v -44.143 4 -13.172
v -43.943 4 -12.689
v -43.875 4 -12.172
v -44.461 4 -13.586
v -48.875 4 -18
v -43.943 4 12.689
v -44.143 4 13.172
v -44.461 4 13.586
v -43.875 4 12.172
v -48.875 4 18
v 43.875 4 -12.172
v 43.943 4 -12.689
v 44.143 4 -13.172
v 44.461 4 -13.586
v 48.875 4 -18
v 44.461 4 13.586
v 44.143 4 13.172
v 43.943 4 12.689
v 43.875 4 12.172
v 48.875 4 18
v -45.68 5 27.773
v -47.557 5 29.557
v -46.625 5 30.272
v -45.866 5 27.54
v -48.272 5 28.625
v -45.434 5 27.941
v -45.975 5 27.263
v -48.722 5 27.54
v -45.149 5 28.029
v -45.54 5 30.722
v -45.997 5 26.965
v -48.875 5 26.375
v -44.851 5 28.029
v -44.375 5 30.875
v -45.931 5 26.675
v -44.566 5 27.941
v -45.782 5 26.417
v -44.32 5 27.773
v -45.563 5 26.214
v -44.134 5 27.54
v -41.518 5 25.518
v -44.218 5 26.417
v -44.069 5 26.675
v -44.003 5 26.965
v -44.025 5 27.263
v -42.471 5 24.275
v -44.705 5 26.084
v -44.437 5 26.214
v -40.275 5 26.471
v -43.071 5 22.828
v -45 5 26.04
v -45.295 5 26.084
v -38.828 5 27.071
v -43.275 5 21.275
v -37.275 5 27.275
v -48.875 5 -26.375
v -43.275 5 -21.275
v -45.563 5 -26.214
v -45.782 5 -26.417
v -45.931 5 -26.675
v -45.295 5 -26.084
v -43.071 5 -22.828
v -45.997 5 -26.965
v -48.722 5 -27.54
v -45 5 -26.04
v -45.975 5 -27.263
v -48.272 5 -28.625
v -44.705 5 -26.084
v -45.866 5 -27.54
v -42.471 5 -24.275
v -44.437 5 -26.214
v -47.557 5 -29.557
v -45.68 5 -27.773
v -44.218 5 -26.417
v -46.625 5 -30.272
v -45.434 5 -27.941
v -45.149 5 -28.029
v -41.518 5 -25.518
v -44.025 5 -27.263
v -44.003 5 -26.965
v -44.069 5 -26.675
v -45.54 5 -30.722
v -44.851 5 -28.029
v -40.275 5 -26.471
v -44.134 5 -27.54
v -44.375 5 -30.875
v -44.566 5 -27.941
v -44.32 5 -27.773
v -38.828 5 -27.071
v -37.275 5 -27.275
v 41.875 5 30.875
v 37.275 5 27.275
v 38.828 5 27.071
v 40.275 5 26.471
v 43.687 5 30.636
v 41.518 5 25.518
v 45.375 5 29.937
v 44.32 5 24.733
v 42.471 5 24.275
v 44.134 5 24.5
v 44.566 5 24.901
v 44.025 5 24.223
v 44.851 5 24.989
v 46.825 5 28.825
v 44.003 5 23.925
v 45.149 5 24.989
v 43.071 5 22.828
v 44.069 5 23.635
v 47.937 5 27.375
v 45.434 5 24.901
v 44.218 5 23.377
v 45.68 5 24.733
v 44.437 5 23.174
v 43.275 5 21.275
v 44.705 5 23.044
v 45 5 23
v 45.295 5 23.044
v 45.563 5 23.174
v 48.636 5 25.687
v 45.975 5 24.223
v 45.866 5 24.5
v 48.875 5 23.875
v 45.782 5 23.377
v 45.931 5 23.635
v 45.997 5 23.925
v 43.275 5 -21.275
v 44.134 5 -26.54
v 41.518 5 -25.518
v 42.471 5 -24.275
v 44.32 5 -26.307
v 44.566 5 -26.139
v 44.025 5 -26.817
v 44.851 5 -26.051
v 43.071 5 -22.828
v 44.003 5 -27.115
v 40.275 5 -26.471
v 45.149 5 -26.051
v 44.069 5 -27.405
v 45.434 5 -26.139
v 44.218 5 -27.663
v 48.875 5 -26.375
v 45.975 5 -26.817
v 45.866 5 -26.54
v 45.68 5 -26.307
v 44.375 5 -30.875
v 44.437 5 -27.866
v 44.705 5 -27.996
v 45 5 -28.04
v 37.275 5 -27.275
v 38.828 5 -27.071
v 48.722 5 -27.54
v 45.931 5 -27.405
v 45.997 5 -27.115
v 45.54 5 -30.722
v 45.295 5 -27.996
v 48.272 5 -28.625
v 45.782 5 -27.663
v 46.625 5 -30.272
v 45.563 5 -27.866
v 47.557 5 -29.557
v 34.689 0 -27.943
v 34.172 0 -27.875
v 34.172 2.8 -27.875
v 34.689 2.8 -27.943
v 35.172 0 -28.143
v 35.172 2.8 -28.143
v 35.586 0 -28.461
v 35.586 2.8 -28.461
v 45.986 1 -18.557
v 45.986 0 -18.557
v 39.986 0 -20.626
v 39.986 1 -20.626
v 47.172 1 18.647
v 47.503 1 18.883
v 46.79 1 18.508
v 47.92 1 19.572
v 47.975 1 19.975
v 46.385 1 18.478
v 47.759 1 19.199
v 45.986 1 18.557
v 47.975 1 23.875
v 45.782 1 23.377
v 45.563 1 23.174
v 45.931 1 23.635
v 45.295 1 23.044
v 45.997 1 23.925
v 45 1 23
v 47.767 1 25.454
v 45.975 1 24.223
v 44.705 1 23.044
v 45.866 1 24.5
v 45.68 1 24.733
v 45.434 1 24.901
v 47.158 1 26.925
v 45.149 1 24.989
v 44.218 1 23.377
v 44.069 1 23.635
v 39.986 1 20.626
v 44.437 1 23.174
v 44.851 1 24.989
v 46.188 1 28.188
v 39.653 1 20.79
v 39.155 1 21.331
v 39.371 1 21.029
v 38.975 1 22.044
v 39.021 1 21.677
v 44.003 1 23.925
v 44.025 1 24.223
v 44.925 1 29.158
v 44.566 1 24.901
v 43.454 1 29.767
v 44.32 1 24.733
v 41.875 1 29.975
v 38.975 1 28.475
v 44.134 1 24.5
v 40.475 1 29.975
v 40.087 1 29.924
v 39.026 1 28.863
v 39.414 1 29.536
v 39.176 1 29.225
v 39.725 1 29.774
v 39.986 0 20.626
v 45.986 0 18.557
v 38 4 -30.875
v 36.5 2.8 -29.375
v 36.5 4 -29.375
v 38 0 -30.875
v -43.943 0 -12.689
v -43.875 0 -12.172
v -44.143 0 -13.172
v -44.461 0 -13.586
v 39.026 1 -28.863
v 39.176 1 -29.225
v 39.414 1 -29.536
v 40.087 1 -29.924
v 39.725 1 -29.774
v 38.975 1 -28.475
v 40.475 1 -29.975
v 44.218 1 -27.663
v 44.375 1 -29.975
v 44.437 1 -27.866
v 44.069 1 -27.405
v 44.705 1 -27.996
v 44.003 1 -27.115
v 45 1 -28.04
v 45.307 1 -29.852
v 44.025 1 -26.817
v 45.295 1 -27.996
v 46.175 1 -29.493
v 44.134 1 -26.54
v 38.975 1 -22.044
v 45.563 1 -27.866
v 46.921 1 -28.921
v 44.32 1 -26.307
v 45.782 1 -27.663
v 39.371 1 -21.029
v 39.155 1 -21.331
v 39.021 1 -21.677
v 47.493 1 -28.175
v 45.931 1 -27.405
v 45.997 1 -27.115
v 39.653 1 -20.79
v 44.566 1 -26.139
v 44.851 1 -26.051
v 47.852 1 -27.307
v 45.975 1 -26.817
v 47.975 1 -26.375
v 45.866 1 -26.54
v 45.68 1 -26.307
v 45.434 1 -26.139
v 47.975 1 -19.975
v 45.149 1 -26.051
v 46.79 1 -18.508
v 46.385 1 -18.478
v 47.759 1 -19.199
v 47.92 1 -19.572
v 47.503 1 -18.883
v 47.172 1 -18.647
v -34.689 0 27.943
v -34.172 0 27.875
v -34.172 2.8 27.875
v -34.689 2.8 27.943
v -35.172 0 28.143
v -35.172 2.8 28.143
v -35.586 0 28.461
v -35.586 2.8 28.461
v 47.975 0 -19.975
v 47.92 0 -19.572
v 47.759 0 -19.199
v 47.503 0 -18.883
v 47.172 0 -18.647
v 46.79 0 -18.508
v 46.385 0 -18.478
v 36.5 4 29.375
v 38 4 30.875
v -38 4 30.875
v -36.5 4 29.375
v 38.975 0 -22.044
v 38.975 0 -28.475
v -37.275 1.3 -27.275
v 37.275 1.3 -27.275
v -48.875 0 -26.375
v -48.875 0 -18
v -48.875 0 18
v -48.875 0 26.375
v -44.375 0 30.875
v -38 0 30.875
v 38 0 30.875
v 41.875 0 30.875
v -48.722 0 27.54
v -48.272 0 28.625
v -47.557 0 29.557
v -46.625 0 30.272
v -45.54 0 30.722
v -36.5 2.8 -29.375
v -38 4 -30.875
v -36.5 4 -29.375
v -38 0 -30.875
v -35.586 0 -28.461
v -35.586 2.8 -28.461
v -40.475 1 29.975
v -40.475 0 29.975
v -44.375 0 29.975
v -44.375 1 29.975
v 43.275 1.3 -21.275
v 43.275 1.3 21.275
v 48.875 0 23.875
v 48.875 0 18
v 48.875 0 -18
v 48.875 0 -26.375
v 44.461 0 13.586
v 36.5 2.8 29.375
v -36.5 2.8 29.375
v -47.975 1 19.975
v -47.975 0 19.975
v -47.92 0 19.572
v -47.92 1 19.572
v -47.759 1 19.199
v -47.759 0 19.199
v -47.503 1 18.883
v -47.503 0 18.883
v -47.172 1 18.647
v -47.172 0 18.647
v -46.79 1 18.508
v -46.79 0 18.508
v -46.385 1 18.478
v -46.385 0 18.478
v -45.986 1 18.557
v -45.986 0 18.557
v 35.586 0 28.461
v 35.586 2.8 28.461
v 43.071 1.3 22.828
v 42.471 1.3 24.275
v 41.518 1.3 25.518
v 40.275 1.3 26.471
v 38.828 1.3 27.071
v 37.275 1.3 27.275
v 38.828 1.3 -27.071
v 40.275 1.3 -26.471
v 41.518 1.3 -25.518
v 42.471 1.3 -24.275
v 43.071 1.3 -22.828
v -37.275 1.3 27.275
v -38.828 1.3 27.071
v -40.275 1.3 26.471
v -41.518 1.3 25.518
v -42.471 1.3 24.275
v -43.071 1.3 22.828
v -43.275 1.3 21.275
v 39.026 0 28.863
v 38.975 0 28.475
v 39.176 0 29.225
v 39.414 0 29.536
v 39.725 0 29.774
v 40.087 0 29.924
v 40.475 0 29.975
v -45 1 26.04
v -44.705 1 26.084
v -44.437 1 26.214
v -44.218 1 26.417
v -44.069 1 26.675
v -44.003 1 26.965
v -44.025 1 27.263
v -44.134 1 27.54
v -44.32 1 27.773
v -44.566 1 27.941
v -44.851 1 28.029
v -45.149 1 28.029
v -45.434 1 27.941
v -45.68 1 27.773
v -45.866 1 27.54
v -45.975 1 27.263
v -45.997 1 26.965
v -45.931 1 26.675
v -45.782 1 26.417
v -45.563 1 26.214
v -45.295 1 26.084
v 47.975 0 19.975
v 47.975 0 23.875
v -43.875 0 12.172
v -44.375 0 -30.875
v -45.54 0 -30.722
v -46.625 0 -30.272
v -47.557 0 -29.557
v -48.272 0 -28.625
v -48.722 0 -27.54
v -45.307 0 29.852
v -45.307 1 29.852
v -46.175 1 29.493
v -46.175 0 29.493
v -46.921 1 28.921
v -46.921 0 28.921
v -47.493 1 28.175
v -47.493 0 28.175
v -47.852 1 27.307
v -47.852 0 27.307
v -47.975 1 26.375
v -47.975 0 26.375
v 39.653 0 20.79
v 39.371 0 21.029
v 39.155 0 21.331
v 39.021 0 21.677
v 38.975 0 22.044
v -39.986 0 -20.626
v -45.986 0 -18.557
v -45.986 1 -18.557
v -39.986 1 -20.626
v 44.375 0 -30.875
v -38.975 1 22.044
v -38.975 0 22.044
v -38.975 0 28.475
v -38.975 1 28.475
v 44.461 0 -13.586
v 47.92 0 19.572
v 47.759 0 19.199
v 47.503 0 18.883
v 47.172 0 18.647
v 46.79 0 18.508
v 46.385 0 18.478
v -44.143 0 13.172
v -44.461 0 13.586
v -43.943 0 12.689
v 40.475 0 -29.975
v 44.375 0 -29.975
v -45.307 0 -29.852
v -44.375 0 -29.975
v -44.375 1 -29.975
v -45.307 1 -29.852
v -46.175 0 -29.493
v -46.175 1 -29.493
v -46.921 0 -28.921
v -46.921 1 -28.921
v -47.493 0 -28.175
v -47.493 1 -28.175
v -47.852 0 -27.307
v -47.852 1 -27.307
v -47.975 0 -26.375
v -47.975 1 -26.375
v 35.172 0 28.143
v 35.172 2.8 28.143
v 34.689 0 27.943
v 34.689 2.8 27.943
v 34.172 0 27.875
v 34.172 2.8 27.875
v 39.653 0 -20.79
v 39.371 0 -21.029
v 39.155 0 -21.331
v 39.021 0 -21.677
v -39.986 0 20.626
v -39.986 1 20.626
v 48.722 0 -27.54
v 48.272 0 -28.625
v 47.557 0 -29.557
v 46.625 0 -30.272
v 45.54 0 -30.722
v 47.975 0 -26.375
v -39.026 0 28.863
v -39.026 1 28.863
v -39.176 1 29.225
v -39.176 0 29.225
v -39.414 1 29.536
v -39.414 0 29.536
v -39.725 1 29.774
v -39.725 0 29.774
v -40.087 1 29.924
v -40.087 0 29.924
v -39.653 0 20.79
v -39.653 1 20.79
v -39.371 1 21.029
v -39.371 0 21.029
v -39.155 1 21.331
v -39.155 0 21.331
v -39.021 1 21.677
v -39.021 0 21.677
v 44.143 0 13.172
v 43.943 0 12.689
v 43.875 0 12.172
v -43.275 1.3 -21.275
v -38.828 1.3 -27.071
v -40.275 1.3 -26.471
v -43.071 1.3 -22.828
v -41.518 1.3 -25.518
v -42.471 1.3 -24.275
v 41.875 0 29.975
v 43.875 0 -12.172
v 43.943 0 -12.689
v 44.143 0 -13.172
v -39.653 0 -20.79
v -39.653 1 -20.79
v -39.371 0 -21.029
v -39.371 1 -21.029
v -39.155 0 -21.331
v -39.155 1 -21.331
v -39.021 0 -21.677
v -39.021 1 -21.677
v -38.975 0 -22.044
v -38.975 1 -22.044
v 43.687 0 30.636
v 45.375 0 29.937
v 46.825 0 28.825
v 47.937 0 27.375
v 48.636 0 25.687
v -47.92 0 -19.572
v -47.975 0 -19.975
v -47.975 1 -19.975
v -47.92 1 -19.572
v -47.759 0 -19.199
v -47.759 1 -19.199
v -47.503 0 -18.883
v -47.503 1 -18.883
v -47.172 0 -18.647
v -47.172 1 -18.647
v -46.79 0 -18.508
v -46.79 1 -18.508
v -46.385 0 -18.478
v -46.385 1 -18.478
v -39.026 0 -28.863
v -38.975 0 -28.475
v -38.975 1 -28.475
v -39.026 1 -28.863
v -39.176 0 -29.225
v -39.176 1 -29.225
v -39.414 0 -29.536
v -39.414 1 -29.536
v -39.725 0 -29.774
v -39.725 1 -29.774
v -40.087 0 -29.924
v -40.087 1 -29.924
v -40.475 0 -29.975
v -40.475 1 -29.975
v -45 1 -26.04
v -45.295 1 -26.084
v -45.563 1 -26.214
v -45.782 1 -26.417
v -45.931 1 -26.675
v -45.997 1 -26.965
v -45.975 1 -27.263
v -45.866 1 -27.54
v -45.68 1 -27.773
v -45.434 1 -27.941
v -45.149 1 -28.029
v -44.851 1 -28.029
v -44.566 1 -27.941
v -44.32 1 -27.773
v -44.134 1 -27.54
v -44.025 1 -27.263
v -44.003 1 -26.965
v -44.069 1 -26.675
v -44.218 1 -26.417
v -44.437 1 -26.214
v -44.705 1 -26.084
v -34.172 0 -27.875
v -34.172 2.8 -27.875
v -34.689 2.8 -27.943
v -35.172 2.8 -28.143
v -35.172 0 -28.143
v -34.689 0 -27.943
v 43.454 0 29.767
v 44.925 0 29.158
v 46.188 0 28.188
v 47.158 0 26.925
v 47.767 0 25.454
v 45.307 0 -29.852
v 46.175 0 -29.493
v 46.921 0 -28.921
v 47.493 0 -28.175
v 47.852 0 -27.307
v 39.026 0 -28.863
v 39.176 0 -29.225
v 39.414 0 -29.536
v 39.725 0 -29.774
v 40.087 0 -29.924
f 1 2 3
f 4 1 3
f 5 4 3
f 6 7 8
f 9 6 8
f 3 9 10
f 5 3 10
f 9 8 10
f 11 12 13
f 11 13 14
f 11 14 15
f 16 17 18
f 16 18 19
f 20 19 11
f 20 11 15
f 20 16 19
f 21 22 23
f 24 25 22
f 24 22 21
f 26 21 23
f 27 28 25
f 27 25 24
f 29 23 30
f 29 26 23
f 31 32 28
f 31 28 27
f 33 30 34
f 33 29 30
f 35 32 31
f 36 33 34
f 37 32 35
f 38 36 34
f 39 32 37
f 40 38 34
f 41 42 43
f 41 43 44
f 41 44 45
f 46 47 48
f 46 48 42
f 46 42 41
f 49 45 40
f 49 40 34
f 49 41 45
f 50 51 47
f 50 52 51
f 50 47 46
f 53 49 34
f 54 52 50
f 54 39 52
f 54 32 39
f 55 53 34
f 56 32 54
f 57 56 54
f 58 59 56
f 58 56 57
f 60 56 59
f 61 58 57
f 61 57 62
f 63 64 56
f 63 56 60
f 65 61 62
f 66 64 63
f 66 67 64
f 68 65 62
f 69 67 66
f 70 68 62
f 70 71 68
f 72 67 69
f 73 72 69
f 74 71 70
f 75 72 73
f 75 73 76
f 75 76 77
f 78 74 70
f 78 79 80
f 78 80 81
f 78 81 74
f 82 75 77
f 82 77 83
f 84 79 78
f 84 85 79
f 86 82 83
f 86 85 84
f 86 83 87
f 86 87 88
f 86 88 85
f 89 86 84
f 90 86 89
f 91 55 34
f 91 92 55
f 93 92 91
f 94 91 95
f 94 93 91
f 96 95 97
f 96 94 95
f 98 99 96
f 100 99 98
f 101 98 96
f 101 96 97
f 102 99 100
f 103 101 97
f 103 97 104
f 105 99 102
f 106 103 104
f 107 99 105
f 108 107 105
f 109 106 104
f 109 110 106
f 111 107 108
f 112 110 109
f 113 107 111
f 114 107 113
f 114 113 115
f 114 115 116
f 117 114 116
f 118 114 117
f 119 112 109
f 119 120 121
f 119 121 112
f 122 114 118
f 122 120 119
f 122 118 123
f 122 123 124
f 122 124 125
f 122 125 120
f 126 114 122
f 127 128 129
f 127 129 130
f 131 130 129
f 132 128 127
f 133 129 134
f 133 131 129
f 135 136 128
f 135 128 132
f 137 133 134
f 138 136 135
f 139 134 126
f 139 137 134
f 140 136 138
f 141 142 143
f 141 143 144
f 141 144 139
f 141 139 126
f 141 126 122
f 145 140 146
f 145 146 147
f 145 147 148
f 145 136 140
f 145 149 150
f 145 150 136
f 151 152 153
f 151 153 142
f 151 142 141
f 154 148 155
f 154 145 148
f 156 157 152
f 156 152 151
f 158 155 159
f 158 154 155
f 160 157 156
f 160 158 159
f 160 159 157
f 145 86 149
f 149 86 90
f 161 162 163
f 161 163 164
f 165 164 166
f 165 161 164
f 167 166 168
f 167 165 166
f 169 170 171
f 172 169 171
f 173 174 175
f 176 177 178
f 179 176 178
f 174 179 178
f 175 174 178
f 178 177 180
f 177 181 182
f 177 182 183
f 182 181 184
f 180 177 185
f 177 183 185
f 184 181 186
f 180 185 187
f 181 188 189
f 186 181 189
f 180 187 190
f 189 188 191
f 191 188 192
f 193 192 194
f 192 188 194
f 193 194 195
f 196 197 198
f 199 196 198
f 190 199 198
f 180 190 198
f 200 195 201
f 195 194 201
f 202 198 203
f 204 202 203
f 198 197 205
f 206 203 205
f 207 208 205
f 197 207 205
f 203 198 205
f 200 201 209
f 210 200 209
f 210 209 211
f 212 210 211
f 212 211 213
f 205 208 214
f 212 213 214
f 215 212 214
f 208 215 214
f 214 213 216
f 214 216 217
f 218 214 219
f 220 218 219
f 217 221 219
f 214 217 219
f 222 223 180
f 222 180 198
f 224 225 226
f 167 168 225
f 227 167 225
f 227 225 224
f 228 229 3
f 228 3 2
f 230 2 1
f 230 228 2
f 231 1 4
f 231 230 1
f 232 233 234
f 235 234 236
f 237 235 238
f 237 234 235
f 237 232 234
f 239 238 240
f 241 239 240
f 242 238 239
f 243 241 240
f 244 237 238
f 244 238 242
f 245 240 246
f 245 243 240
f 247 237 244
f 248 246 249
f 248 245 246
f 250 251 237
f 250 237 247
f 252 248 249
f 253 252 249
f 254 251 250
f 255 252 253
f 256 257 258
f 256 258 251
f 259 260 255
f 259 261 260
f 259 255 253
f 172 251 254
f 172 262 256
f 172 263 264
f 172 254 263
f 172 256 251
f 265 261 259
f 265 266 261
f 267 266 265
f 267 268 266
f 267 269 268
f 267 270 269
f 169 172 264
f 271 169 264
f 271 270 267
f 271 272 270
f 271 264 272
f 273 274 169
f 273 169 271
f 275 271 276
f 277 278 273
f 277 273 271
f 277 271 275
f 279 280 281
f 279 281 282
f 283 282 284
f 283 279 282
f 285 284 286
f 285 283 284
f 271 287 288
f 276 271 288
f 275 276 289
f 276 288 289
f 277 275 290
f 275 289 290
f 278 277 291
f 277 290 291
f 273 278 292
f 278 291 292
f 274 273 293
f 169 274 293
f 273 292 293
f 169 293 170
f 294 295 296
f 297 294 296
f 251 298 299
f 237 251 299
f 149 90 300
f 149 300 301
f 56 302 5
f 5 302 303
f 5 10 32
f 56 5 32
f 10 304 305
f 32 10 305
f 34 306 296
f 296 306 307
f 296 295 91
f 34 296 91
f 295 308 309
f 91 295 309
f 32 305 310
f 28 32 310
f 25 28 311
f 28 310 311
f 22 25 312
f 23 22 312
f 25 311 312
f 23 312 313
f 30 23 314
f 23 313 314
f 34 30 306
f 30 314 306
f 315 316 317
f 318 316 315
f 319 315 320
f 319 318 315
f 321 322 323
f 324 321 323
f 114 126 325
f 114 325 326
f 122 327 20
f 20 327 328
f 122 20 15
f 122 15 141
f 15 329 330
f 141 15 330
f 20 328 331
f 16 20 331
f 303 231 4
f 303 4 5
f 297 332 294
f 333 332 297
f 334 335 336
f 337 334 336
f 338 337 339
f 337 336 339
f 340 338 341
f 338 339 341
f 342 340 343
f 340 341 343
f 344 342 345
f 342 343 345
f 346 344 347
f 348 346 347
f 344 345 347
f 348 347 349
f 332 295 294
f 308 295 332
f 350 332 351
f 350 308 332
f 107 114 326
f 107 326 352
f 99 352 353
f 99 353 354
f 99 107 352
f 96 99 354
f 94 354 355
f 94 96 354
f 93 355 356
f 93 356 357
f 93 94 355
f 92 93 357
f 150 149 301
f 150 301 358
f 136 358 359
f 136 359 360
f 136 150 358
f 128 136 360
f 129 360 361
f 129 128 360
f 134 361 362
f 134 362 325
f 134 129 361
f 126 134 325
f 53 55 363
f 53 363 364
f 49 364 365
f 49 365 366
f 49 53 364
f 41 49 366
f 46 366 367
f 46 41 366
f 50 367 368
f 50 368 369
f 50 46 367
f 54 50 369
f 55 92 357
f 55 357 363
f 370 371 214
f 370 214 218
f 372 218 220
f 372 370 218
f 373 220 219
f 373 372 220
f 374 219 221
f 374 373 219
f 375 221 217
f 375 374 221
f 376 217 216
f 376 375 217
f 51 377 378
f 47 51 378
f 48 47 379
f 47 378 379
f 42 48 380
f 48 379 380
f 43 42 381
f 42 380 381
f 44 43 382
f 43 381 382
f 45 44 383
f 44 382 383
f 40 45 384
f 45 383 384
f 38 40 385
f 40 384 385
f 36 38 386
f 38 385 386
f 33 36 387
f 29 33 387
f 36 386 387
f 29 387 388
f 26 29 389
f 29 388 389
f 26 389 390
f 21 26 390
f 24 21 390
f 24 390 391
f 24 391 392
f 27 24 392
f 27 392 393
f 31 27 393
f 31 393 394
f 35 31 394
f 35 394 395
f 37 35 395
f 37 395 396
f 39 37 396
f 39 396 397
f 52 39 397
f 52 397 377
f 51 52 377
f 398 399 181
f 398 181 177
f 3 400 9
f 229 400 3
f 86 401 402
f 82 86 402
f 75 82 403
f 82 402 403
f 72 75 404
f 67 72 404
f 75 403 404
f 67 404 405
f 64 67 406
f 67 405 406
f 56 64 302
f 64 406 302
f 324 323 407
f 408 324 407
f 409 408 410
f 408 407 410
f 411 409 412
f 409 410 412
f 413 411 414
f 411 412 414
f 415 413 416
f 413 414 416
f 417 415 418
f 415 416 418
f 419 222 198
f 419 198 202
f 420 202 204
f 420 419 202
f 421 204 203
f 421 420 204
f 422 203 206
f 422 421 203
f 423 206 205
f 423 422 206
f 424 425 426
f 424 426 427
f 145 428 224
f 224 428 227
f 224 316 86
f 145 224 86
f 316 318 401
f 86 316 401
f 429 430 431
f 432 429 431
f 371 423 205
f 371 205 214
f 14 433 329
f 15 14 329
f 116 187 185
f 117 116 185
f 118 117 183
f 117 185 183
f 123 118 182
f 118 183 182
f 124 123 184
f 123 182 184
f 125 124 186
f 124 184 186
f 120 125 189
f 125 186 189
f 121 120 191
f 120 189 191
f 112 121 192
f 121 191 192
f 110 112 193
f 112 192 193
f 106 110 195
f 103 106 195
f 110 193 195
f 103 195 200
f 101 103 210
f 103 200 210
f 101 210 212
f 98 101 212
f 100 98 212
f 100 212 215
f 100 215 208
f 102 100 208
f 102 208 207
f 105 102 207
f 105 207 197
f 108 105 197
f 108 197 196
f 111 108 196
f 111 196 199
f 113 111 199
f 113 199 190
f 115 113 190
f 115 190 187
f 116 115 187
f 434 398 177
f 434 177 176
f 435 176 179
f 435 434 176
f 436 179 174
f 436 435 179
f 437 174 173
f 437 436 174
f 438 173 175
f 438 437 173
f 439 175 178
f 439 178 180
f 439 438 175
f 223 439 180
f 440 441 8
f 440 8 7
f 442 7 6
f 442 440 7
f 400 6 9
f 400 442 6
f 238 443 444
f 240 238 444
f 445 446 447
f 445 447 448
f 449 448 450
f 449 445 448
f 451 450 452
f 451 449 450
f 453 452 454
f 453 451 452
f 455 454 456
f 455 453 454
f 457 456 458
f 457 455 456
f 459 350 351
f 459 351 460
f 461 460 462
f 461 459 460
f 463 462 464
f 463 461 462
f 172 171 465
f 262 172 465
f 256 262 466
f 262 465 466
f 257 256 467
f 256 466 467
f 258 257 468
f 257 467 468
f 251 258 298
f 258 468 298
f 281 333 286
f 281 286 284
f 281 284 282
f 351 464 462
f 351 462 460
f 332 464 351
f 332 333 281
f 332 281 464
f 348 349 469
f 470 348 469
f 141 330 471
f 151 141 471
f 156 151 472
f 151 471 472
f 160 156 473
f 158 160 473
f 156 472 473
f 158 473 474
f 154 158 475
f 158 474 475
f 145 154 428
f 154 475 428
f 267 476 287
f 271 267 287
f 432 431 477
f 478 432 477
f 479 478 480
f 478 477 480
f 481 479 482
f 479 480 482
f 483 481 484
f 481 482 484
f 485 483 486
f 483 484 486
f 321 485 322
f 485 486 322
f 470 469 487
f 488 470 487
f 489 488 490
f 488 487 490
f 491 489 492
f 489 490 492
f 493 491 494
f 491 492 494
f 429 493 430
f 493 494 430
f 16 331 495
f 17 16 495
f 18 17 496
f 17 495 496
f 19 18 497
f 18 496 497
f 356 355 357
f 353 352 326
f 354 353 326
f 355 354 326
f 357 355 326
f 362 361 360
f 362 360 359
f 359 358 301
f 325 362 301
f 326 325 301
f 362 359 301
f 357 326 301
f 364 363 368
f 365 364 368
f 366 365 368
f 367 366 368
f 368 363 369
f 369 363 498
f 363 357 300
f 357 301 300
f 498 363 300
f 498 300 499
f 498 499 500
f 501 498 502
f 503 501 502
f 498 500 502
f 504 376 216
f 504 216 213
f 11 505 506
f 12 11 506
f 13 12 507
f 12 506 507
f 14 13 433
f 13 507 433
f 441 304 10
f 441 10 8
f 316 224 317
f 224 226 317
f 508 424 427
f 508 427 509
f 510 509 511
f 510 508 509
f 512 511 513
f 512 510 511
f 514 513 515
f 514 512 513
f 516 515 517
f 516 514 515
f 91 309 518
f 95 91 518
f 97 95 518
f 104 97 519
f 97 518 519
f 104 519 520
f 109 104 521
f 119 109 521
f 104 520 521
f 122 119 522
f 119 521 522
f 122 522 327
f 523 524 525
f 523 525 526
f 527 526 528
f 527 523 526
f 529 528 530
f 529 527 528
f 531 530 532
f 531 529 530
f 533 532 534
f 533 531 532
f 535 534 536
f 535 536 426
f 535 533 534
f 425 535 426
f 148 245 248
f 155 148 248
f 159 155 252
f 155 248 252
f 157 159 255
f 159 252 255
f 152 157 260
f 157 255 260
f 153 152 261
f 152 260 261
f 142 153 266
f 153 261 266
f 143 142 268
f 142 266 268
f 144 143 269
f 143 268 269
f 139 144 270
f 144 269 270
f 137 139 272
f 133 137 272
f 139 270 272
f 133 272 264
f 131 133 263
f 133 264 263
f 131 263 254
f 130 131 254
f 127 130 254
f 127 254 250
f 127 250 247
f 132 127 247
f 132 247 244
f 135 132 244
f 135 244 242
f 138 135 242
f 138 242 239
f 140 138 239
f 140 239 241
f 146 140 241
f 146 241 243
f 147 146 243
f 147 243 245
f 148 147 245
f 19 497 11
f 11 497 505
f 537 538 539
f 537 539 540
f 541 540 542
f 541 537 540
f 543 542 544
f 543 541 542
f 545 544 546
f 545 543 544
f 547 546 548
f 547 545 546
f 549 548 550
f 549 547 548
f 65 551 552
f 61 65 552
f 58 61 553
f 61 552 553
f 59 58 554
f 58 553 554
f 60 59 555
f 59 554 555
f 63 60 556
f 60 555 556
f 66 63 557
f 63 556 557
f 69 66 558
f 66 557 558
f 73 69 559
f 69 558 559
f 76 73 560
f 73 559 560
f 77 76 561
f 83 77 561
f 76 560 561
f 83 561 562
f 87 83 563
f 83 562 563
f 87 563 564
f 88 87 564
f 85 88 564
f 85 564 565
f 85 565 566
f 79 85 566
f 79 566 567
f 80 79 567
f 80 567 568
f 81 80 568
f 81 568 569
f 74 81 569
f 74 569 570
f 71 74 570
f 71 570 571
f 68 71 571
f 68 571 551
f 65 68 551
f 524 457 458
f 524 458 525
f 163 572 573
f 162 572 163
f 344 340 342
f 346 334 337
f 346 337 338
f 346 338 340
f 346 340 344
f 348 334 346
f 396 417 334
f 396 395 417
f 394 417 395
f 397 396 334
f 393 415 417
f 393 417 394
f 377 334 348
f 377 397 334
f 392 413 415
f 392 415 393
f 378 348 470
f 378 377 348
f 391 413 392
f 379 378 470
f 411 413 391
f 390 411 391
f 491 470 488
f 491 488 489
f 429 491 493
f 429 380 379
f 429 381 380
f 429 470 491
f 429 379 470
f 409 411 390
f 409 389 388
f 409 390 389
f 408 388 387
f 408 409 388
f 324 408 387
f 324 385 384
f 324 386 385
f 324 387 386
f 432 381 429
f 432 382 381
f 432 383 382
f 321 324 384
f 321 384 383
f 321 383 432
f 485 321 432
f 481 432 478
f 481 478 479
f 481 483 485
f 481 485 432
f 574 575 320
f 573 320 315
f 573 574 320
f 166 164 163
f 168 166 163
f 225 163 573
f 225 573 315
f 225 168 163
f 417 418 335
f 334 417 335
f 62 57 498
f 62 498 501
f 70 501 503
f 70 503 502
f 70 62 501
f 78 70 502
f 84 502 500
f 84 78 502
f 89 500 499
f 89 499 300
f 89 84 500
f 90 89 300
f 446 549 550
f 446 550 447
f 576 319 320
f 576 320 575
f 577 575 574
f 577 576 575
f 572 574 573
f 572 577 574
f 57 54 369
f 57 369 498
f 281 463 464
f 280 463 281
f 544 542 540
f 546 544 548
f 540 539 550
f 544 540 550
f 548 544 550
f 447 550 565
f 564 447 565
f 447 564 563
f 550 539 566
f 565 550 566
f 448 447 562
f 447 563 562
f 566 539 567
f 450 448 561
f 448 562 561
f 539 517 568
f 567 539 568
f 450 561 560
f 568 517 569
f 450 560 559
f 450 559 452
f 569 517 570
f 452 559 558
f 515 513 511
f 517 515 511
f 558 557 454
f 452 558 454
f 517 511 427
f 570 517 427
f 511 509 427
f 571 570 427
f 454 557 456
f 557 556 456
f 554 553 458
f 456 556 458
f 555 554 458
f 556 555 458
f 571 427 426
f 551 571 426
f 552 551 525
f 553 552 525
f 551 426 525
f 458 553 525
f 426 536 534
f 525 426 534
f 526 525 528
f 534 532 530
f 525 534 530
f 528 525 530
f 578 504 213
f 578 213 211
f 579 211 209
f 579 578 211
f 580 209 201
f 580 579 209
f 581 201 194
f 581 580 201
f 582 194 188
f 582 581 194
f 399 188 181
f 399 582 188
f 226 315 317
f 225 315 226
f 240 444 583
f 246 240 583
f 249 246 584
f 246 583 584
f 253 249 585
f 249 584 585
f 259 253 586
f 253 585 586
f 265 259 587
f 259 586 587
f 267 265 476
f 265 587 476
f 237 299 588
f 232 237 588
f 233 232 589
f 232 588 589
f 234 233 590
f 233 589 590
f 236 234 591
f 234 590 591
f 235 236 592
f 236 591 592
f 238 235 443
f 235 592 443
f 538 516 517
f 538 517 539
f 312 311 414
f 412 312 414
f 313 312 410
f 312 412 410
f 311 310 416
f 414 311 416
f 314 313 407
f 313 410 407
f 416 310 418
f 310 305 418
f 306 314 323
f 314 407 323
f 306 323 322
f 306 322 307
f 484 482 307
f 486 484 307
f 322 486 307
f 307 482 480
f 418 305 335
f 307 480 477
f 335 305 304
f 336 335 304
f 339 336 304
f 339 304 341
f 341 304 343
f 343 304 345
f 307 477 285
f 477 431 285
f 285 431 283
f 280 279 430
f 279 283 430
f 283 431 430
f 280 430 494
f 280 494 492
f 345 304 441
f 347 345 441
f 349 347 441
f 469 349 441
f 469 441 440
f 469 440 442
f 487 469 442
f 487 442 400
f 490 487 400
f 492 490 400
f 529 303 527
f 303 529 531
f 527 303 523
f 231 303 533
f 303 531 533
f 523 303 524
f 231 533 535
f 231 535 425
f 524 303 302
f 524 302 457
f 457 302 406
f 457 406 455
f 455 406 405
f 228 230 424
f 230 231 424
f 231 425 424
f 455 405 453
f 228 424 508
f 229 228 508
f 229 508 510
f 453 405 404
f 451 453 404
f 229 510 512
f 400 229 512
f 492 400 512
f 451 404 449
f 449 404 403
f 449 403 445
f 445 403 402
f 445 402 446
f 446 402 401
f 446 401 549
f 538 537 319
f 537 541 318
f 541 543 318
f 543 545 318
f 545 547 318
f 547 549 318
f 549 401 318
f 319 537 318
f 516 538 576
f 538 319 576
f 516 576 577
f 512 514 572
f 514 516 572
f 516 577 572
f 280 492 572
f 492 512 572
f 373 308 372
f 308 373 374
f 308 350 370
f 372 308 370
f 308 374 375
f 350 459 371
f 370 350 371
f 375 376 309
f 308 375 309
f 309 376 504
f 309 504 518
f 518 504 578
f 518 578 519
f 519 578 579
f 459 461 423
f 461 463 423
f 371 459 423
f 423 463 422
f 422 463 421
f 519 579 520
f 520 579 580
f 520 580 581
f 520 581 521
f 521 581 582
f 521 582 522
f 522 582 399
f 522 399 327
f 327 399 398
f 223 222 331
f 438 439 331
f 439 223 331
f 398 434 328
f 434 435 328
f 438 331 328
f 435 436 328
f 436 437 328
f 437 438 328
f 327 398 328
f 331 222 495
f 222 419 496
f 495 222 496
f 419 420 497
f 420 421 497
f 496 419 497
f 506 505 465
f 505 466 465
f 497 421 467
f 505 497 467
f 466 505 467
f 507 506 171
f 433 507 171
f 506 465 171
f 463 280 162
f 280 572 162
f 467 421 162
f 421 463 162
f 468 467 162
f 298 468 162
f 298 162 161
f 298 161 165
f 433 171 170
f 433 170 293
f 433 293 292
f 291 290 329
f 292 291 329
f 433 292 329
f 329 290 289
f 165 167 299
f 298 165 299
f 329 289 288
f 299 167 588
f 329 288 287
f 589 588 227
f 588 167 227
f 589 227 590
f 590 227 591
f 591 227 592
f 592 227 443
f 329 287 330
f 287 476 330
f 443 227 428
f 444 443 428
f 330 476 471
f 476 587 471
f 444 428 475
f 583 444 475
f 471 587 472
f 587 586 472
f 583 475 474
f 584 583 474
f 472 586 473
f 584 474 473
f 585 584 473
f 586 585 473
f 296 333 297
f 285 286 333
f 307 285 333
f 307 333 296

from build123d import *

# Parameters (mm, degrees)
BOSS_EXTRUDE2_DEPTH = 5
CUT_EXTRUDE2_DEPTH  = 4
BOSS_EXTRUDE4_START = 1.2
BOSS_EXTRUDE4_DEPTH = 1.2
CUT_EXTRUDE5_DEPTH  = 1
SKETCH13_R          = 1
CUT_EXTRUDE6_DEPTH  = 58.948522414
CUT_EXTRUDE10_DEPTH = 3.7


with BuildPart() as part:
    # Sketch5 → Boss-Extrude2 (new body)
    with BuildSketch(Plane(origin=(0, 0, 0), x_dir=(1, 0, 0), z_dir=(0, 1, 0))):
        with BuildLine():
            Line((-44.375, -30.875), (41.875, -30.875))
            ThreePointArc((41.875, -30.875), (46.824747468, -28.824747468), (48.875, -23.875))
            Line((48.875, -23.875), (48.875, 26.375))
            ThreePointArc((48.875, 26.375), (47.556980515, 29.556980515), (44.375, 30.875))
            Line((44.375, 30.875), (-44.375, 30.875))
            ThreePointArc((-44.375, 30.875), (-47.556980515, 29.556980515), (-48.875, 26.375))
            Line((-48.875, 26.375), (-48.875, -26.375))
            ThreePointArc((-48.875, -26.375), (-47.556980515, -29.556980515), (-44.375, -30.875))
        make_face()
    extrude(amount=BOSS_EXTRUDE2_DEPTH)

    # Sketch10 → Cut-Extrude2 (cut)
    with BuildSketch(Plane.XZ):
        with BuildLine():
            Line((-48.875, 18), (-44.460786438, 13.585786438))
            ThreePointArc((-44.460786438, 13.585786438), (-44.027240935, 12.93693974), (-43.875, 12.171572875))
            Line((-43.875, 12.171572875), (-43.875, -12.171572875))
            ThreePointArc((-43.875, -12.171572875), (-44.027240935, -12.93693974), (-44.460786438, -13.585786438))
            Line((-44.460786438, -13.585786438), (-48.875, -18))
            Line((-48.875, -18), (-48.875, 18))
        make_face()
        with BuildLine():
            Line((48.875, -18), (48.875, 18))
            Line((48.875, 18), (44.460786438, 13.585786438))
            ThreePointArc((44.460786438, 13.585786438), (44.027240935, 12.93693974), (43.875, 12.171572875))
            Line((43.875, 12.171572875), (43.875, -12.171572875))
            ThreePointArc((43.875, -12.171572875), (44.027240935, -12.93693974), (44.460786438, -13.585786438))
            Line((44.460786438, -13.585786438), (48.875, -18))
        make_face()
        with BuildLine():
            Line((-38, -30.875), (-35.585786438, -28.460786438))
            ThreePointArc((-35.585786438, -28.460786438), (-34.93693974, -28.027240935), (-34.171572875, -27.875))
            Line((-34.171572875, -27.875), (34.171572875, -27.875))
            ThreePointArc((34.171572875, -27.875), (34.93693974, -28.027240935), (35.585786438, -28.460786438))
            Line((35.585786438, -28.460786438), (38, -30.875))
            Line((38, -30.875), (-38, -30.875))
        make_face()
        with BuildLine():
            Line((-38, 30.875), (38, 30.875))
            Line((38, 30.875), (35.585786438, 28.460786438))
            ThreePointArc((35.585786438, 28.460786438), (34.93693974, 28.027240935), (34.171572875, 27.875))
            Line((34.171572875, 27.875), (-34.171572875, 27.875))
            ThreePointArc((-34.171572875, 27.875), (-34.93693974, 28.027240935), (-35.585786438, 28.460786438))
            Line((-35.585786438, 28.460786438), (-38, 30.875))
        make_face()
    extrude(amount=-CUT_EXTRUDE2_DEPTH, mode=Mode.SUBTRACT)

    # Sketch11 → Boss-Extrude4 (add)
    with BuildSketch(Plane.XZ.offset(-4).offset(BOSS_EXTRUDE4_START)):
        with BuildLine():
            Line((-35.585786438, -28.460786438), (-36.5, -29.375))
            Line((-36.5, -29.375), (36.5, -29.375))
            Line((36.5, -29.375), (35.585786438, -28.460786438))
            ThreePointArc((35.585786438, -28.460786438), (34.93693974, -28.027240935), (34.171572875, -27.875))
            Line((34.171572875, -27.875), (-34.171572875, -27.875))
            ThreePointArc((-34.171572875, -27.875), (-34.93693974, -28.027240935), (-35.585786438, -28.460786438))
        make_face()
        with BuildLine():
            Line((-36.5, 29.375), (-35.585786438, 28.460786438))
            ThreePointArc((-35.585786438, 28.460786438), (-34.93693974, 28.027240935), (-34.171572875, 27.875))
            Line((-34.171572875, 27.875), (34.171572875, 27.875))
            ThreePointArc((34.171572875, 27.875), (34.93693974, 28.027240935), (35.585786438, 28.460786438))
            Line((35.585786438, 28.460786438), (36.5, 29.375))
            Line((36.5, 29.375), (-36.5, 29.375))
        make_face()
    extrude(amount=-BOSS_EXTRUDE4_DEPTH)

    # Sketch6 → Cut-Extrude5 (cut)
    with BuildSketch(Plane.XZ):
        with BuildLine():
            Line((-47.975, 26.375), (-47.975, 19.975))
            ThreePointArc((-47.975, 19.975), (-47.345745068, 18.753606113), (-45.985929297, 18.55696973))
            Line((-45.985929297, 18.55696973), (-39.985929297, 20.626336144))
            ThreePointArc((-39.985929297, 20.626336144), (-39.253606113, 21.173621347), (-38.975, 22.044366415))
            Line((-38.975, 22.044366415), (-38.975, 28.475))
            ThreePointArc((-38.975, 28.475), (-39.414339828, 29.535660172), (-40.475, 29.975))
            Line((-40.475, 29.975), (-44.375, 29.975))
            ThreePointArc((-44.375, 29.975), (-46.920584412, 28.920584412), (-47.975, 26.375))
        make_face()
        with BuildLine():
            Line((40.475, 29.975), (41.875, 29.975))
            ThreePointArc((41.875, 29.975), (46.188351365, 28.188351365), (47.975, 23.875))
            Line((47.975, 23.875), (47.975, 19.975))
            ThreePointArc((47.975, 19.975), (47.345745068, 18.753606113), (45.985929297, 18.55696973))
            Line((45.985929297, 18.55696973), (39.985929297, 20.626336144))
            ThreePointArc((39.985929297, 20.626336144), (39.253606113, 21.173621347), (38.975, 22.044366415))
            Line((38.975, 22.044366415), (38.975, 28.475))
            ThreePointArc((38.975, 28.475), (39.414339828, 29.535660172), (40.475, 29.975))
        make_face()
        with BuildLine():
            Line((47.975, -26.375), (47.975, -19.975))
            ThreePointArc((47.975, -19.975), (47.345745068, -18.753606113), (45.985929297, -18.55696973))
            Line((45.985929297, -18.55696973), (39.985929297, -20.626336144))
            ThreePointArc((39.985929297, -20.626336144), (39.253606113, -21.173621347), (38.975, -22.044366415))
            Line((38.975, -22.044366415), (38.975, -28.475))
            ThreePointArc((38.975, -28.475), (39.414339828, -29.535660172), (40.475, -29.975))
            Line((40.475, -29.975), (44.375, -29.975))
            ThreePointArc((44.375, -29.975), (46.920584412, -28.920584412), (47.975, -26.375))
        make_face()
        with BuildLine():
            Line((-40.475, -29.975), (-44.375, -29.975))
            ThreePointArc((-44.375, -29.975), (-46.920584412, -28.920584412), (-47.975, -26.375))
            Line((-47.975, -26.375), (-47.975, -19.975))
            ThreePointArc((-47.975, -19.975), (-47.345745068, -18.753606113), (-45.985929297, -18.55696973))
            Line((-45.985929297, -18.55696973), (-39.985929297, -20.626336144))
            ThreePointArc((-39.985929297, -20.626336144), (-39.253606113, -21.173621347), (-38.975, -22.044366415))
            Line((-38.975, -22.044366415), (-38.975, -28.475))
            ThreePointArc((-38.975, -28.475), (-39.414339828, -29.535660172), (-40.475, -29.975))
        make_face()
    extrude(amount=-CUT_EXTRUDE5_DEPTH, mode=Mode.SUBTRACT)

    # Sketch13 → Cut-Extrude6 (cut, through all)
    with BuildSketch(Plane.XZ.offset(-1)):
        with Locations(Location((-45, 27.04, 0), (0, 0, 270))):
            Circle(SKETCH13_R)
        with Locations(Location((-45, -27.04, 0), (0, 0, 90))):
            Circle(SKETCH13_R)
        with Locations(Location((45, -27.04, 0), (0, 0, 270))):
            Circle(SKETCH13_R)
        with Locations(Location((45, 24, 0), (0, 0, 270))):
            Circle(SKETCH13_R)
    extrude(amount=-CUT_EXTRUDE6_DEPTH, mode=Mode.SUBTRACT)

    # Sketch16 → Cut-Extrude10 (cut)
    with BuildSketch(Plane(origin=(0, 5, 0), x_dir=(1, 0, 0), z_dir=(0, 1, 0))):
        with BuildLine():
            Line((-37.275, 27.275), (37.275, 27.275))
            ThreePointArc((37.275, 27.275), (41.517640687, 25.517640687), (43.275, 21.275))
            Line((43.275, 21.275), (43.275, -21.275))
            ThreePointArc((43.275, -21.275), (41.517640687, -25.517640687), (37.275, -27.275))
            Line((37.275, -27.275), (-37.275, -27.275))
            ThreePointArc((-37.275, -27.275), (-41.517640687, -25.517640687), (-43.275, -21.275))
            Line((-43.275, -21.275), (-43.275, 21.275))
            ThreePointArc((-43.275, 21.275), (-41.517640687, 25.517640687), (-37.275, 27.275))
        make_face()
    extrude(amount=-CUT_EXTRUDE10_DEPTH, mode=Mode.SUBTRACT)


solid = part.part
